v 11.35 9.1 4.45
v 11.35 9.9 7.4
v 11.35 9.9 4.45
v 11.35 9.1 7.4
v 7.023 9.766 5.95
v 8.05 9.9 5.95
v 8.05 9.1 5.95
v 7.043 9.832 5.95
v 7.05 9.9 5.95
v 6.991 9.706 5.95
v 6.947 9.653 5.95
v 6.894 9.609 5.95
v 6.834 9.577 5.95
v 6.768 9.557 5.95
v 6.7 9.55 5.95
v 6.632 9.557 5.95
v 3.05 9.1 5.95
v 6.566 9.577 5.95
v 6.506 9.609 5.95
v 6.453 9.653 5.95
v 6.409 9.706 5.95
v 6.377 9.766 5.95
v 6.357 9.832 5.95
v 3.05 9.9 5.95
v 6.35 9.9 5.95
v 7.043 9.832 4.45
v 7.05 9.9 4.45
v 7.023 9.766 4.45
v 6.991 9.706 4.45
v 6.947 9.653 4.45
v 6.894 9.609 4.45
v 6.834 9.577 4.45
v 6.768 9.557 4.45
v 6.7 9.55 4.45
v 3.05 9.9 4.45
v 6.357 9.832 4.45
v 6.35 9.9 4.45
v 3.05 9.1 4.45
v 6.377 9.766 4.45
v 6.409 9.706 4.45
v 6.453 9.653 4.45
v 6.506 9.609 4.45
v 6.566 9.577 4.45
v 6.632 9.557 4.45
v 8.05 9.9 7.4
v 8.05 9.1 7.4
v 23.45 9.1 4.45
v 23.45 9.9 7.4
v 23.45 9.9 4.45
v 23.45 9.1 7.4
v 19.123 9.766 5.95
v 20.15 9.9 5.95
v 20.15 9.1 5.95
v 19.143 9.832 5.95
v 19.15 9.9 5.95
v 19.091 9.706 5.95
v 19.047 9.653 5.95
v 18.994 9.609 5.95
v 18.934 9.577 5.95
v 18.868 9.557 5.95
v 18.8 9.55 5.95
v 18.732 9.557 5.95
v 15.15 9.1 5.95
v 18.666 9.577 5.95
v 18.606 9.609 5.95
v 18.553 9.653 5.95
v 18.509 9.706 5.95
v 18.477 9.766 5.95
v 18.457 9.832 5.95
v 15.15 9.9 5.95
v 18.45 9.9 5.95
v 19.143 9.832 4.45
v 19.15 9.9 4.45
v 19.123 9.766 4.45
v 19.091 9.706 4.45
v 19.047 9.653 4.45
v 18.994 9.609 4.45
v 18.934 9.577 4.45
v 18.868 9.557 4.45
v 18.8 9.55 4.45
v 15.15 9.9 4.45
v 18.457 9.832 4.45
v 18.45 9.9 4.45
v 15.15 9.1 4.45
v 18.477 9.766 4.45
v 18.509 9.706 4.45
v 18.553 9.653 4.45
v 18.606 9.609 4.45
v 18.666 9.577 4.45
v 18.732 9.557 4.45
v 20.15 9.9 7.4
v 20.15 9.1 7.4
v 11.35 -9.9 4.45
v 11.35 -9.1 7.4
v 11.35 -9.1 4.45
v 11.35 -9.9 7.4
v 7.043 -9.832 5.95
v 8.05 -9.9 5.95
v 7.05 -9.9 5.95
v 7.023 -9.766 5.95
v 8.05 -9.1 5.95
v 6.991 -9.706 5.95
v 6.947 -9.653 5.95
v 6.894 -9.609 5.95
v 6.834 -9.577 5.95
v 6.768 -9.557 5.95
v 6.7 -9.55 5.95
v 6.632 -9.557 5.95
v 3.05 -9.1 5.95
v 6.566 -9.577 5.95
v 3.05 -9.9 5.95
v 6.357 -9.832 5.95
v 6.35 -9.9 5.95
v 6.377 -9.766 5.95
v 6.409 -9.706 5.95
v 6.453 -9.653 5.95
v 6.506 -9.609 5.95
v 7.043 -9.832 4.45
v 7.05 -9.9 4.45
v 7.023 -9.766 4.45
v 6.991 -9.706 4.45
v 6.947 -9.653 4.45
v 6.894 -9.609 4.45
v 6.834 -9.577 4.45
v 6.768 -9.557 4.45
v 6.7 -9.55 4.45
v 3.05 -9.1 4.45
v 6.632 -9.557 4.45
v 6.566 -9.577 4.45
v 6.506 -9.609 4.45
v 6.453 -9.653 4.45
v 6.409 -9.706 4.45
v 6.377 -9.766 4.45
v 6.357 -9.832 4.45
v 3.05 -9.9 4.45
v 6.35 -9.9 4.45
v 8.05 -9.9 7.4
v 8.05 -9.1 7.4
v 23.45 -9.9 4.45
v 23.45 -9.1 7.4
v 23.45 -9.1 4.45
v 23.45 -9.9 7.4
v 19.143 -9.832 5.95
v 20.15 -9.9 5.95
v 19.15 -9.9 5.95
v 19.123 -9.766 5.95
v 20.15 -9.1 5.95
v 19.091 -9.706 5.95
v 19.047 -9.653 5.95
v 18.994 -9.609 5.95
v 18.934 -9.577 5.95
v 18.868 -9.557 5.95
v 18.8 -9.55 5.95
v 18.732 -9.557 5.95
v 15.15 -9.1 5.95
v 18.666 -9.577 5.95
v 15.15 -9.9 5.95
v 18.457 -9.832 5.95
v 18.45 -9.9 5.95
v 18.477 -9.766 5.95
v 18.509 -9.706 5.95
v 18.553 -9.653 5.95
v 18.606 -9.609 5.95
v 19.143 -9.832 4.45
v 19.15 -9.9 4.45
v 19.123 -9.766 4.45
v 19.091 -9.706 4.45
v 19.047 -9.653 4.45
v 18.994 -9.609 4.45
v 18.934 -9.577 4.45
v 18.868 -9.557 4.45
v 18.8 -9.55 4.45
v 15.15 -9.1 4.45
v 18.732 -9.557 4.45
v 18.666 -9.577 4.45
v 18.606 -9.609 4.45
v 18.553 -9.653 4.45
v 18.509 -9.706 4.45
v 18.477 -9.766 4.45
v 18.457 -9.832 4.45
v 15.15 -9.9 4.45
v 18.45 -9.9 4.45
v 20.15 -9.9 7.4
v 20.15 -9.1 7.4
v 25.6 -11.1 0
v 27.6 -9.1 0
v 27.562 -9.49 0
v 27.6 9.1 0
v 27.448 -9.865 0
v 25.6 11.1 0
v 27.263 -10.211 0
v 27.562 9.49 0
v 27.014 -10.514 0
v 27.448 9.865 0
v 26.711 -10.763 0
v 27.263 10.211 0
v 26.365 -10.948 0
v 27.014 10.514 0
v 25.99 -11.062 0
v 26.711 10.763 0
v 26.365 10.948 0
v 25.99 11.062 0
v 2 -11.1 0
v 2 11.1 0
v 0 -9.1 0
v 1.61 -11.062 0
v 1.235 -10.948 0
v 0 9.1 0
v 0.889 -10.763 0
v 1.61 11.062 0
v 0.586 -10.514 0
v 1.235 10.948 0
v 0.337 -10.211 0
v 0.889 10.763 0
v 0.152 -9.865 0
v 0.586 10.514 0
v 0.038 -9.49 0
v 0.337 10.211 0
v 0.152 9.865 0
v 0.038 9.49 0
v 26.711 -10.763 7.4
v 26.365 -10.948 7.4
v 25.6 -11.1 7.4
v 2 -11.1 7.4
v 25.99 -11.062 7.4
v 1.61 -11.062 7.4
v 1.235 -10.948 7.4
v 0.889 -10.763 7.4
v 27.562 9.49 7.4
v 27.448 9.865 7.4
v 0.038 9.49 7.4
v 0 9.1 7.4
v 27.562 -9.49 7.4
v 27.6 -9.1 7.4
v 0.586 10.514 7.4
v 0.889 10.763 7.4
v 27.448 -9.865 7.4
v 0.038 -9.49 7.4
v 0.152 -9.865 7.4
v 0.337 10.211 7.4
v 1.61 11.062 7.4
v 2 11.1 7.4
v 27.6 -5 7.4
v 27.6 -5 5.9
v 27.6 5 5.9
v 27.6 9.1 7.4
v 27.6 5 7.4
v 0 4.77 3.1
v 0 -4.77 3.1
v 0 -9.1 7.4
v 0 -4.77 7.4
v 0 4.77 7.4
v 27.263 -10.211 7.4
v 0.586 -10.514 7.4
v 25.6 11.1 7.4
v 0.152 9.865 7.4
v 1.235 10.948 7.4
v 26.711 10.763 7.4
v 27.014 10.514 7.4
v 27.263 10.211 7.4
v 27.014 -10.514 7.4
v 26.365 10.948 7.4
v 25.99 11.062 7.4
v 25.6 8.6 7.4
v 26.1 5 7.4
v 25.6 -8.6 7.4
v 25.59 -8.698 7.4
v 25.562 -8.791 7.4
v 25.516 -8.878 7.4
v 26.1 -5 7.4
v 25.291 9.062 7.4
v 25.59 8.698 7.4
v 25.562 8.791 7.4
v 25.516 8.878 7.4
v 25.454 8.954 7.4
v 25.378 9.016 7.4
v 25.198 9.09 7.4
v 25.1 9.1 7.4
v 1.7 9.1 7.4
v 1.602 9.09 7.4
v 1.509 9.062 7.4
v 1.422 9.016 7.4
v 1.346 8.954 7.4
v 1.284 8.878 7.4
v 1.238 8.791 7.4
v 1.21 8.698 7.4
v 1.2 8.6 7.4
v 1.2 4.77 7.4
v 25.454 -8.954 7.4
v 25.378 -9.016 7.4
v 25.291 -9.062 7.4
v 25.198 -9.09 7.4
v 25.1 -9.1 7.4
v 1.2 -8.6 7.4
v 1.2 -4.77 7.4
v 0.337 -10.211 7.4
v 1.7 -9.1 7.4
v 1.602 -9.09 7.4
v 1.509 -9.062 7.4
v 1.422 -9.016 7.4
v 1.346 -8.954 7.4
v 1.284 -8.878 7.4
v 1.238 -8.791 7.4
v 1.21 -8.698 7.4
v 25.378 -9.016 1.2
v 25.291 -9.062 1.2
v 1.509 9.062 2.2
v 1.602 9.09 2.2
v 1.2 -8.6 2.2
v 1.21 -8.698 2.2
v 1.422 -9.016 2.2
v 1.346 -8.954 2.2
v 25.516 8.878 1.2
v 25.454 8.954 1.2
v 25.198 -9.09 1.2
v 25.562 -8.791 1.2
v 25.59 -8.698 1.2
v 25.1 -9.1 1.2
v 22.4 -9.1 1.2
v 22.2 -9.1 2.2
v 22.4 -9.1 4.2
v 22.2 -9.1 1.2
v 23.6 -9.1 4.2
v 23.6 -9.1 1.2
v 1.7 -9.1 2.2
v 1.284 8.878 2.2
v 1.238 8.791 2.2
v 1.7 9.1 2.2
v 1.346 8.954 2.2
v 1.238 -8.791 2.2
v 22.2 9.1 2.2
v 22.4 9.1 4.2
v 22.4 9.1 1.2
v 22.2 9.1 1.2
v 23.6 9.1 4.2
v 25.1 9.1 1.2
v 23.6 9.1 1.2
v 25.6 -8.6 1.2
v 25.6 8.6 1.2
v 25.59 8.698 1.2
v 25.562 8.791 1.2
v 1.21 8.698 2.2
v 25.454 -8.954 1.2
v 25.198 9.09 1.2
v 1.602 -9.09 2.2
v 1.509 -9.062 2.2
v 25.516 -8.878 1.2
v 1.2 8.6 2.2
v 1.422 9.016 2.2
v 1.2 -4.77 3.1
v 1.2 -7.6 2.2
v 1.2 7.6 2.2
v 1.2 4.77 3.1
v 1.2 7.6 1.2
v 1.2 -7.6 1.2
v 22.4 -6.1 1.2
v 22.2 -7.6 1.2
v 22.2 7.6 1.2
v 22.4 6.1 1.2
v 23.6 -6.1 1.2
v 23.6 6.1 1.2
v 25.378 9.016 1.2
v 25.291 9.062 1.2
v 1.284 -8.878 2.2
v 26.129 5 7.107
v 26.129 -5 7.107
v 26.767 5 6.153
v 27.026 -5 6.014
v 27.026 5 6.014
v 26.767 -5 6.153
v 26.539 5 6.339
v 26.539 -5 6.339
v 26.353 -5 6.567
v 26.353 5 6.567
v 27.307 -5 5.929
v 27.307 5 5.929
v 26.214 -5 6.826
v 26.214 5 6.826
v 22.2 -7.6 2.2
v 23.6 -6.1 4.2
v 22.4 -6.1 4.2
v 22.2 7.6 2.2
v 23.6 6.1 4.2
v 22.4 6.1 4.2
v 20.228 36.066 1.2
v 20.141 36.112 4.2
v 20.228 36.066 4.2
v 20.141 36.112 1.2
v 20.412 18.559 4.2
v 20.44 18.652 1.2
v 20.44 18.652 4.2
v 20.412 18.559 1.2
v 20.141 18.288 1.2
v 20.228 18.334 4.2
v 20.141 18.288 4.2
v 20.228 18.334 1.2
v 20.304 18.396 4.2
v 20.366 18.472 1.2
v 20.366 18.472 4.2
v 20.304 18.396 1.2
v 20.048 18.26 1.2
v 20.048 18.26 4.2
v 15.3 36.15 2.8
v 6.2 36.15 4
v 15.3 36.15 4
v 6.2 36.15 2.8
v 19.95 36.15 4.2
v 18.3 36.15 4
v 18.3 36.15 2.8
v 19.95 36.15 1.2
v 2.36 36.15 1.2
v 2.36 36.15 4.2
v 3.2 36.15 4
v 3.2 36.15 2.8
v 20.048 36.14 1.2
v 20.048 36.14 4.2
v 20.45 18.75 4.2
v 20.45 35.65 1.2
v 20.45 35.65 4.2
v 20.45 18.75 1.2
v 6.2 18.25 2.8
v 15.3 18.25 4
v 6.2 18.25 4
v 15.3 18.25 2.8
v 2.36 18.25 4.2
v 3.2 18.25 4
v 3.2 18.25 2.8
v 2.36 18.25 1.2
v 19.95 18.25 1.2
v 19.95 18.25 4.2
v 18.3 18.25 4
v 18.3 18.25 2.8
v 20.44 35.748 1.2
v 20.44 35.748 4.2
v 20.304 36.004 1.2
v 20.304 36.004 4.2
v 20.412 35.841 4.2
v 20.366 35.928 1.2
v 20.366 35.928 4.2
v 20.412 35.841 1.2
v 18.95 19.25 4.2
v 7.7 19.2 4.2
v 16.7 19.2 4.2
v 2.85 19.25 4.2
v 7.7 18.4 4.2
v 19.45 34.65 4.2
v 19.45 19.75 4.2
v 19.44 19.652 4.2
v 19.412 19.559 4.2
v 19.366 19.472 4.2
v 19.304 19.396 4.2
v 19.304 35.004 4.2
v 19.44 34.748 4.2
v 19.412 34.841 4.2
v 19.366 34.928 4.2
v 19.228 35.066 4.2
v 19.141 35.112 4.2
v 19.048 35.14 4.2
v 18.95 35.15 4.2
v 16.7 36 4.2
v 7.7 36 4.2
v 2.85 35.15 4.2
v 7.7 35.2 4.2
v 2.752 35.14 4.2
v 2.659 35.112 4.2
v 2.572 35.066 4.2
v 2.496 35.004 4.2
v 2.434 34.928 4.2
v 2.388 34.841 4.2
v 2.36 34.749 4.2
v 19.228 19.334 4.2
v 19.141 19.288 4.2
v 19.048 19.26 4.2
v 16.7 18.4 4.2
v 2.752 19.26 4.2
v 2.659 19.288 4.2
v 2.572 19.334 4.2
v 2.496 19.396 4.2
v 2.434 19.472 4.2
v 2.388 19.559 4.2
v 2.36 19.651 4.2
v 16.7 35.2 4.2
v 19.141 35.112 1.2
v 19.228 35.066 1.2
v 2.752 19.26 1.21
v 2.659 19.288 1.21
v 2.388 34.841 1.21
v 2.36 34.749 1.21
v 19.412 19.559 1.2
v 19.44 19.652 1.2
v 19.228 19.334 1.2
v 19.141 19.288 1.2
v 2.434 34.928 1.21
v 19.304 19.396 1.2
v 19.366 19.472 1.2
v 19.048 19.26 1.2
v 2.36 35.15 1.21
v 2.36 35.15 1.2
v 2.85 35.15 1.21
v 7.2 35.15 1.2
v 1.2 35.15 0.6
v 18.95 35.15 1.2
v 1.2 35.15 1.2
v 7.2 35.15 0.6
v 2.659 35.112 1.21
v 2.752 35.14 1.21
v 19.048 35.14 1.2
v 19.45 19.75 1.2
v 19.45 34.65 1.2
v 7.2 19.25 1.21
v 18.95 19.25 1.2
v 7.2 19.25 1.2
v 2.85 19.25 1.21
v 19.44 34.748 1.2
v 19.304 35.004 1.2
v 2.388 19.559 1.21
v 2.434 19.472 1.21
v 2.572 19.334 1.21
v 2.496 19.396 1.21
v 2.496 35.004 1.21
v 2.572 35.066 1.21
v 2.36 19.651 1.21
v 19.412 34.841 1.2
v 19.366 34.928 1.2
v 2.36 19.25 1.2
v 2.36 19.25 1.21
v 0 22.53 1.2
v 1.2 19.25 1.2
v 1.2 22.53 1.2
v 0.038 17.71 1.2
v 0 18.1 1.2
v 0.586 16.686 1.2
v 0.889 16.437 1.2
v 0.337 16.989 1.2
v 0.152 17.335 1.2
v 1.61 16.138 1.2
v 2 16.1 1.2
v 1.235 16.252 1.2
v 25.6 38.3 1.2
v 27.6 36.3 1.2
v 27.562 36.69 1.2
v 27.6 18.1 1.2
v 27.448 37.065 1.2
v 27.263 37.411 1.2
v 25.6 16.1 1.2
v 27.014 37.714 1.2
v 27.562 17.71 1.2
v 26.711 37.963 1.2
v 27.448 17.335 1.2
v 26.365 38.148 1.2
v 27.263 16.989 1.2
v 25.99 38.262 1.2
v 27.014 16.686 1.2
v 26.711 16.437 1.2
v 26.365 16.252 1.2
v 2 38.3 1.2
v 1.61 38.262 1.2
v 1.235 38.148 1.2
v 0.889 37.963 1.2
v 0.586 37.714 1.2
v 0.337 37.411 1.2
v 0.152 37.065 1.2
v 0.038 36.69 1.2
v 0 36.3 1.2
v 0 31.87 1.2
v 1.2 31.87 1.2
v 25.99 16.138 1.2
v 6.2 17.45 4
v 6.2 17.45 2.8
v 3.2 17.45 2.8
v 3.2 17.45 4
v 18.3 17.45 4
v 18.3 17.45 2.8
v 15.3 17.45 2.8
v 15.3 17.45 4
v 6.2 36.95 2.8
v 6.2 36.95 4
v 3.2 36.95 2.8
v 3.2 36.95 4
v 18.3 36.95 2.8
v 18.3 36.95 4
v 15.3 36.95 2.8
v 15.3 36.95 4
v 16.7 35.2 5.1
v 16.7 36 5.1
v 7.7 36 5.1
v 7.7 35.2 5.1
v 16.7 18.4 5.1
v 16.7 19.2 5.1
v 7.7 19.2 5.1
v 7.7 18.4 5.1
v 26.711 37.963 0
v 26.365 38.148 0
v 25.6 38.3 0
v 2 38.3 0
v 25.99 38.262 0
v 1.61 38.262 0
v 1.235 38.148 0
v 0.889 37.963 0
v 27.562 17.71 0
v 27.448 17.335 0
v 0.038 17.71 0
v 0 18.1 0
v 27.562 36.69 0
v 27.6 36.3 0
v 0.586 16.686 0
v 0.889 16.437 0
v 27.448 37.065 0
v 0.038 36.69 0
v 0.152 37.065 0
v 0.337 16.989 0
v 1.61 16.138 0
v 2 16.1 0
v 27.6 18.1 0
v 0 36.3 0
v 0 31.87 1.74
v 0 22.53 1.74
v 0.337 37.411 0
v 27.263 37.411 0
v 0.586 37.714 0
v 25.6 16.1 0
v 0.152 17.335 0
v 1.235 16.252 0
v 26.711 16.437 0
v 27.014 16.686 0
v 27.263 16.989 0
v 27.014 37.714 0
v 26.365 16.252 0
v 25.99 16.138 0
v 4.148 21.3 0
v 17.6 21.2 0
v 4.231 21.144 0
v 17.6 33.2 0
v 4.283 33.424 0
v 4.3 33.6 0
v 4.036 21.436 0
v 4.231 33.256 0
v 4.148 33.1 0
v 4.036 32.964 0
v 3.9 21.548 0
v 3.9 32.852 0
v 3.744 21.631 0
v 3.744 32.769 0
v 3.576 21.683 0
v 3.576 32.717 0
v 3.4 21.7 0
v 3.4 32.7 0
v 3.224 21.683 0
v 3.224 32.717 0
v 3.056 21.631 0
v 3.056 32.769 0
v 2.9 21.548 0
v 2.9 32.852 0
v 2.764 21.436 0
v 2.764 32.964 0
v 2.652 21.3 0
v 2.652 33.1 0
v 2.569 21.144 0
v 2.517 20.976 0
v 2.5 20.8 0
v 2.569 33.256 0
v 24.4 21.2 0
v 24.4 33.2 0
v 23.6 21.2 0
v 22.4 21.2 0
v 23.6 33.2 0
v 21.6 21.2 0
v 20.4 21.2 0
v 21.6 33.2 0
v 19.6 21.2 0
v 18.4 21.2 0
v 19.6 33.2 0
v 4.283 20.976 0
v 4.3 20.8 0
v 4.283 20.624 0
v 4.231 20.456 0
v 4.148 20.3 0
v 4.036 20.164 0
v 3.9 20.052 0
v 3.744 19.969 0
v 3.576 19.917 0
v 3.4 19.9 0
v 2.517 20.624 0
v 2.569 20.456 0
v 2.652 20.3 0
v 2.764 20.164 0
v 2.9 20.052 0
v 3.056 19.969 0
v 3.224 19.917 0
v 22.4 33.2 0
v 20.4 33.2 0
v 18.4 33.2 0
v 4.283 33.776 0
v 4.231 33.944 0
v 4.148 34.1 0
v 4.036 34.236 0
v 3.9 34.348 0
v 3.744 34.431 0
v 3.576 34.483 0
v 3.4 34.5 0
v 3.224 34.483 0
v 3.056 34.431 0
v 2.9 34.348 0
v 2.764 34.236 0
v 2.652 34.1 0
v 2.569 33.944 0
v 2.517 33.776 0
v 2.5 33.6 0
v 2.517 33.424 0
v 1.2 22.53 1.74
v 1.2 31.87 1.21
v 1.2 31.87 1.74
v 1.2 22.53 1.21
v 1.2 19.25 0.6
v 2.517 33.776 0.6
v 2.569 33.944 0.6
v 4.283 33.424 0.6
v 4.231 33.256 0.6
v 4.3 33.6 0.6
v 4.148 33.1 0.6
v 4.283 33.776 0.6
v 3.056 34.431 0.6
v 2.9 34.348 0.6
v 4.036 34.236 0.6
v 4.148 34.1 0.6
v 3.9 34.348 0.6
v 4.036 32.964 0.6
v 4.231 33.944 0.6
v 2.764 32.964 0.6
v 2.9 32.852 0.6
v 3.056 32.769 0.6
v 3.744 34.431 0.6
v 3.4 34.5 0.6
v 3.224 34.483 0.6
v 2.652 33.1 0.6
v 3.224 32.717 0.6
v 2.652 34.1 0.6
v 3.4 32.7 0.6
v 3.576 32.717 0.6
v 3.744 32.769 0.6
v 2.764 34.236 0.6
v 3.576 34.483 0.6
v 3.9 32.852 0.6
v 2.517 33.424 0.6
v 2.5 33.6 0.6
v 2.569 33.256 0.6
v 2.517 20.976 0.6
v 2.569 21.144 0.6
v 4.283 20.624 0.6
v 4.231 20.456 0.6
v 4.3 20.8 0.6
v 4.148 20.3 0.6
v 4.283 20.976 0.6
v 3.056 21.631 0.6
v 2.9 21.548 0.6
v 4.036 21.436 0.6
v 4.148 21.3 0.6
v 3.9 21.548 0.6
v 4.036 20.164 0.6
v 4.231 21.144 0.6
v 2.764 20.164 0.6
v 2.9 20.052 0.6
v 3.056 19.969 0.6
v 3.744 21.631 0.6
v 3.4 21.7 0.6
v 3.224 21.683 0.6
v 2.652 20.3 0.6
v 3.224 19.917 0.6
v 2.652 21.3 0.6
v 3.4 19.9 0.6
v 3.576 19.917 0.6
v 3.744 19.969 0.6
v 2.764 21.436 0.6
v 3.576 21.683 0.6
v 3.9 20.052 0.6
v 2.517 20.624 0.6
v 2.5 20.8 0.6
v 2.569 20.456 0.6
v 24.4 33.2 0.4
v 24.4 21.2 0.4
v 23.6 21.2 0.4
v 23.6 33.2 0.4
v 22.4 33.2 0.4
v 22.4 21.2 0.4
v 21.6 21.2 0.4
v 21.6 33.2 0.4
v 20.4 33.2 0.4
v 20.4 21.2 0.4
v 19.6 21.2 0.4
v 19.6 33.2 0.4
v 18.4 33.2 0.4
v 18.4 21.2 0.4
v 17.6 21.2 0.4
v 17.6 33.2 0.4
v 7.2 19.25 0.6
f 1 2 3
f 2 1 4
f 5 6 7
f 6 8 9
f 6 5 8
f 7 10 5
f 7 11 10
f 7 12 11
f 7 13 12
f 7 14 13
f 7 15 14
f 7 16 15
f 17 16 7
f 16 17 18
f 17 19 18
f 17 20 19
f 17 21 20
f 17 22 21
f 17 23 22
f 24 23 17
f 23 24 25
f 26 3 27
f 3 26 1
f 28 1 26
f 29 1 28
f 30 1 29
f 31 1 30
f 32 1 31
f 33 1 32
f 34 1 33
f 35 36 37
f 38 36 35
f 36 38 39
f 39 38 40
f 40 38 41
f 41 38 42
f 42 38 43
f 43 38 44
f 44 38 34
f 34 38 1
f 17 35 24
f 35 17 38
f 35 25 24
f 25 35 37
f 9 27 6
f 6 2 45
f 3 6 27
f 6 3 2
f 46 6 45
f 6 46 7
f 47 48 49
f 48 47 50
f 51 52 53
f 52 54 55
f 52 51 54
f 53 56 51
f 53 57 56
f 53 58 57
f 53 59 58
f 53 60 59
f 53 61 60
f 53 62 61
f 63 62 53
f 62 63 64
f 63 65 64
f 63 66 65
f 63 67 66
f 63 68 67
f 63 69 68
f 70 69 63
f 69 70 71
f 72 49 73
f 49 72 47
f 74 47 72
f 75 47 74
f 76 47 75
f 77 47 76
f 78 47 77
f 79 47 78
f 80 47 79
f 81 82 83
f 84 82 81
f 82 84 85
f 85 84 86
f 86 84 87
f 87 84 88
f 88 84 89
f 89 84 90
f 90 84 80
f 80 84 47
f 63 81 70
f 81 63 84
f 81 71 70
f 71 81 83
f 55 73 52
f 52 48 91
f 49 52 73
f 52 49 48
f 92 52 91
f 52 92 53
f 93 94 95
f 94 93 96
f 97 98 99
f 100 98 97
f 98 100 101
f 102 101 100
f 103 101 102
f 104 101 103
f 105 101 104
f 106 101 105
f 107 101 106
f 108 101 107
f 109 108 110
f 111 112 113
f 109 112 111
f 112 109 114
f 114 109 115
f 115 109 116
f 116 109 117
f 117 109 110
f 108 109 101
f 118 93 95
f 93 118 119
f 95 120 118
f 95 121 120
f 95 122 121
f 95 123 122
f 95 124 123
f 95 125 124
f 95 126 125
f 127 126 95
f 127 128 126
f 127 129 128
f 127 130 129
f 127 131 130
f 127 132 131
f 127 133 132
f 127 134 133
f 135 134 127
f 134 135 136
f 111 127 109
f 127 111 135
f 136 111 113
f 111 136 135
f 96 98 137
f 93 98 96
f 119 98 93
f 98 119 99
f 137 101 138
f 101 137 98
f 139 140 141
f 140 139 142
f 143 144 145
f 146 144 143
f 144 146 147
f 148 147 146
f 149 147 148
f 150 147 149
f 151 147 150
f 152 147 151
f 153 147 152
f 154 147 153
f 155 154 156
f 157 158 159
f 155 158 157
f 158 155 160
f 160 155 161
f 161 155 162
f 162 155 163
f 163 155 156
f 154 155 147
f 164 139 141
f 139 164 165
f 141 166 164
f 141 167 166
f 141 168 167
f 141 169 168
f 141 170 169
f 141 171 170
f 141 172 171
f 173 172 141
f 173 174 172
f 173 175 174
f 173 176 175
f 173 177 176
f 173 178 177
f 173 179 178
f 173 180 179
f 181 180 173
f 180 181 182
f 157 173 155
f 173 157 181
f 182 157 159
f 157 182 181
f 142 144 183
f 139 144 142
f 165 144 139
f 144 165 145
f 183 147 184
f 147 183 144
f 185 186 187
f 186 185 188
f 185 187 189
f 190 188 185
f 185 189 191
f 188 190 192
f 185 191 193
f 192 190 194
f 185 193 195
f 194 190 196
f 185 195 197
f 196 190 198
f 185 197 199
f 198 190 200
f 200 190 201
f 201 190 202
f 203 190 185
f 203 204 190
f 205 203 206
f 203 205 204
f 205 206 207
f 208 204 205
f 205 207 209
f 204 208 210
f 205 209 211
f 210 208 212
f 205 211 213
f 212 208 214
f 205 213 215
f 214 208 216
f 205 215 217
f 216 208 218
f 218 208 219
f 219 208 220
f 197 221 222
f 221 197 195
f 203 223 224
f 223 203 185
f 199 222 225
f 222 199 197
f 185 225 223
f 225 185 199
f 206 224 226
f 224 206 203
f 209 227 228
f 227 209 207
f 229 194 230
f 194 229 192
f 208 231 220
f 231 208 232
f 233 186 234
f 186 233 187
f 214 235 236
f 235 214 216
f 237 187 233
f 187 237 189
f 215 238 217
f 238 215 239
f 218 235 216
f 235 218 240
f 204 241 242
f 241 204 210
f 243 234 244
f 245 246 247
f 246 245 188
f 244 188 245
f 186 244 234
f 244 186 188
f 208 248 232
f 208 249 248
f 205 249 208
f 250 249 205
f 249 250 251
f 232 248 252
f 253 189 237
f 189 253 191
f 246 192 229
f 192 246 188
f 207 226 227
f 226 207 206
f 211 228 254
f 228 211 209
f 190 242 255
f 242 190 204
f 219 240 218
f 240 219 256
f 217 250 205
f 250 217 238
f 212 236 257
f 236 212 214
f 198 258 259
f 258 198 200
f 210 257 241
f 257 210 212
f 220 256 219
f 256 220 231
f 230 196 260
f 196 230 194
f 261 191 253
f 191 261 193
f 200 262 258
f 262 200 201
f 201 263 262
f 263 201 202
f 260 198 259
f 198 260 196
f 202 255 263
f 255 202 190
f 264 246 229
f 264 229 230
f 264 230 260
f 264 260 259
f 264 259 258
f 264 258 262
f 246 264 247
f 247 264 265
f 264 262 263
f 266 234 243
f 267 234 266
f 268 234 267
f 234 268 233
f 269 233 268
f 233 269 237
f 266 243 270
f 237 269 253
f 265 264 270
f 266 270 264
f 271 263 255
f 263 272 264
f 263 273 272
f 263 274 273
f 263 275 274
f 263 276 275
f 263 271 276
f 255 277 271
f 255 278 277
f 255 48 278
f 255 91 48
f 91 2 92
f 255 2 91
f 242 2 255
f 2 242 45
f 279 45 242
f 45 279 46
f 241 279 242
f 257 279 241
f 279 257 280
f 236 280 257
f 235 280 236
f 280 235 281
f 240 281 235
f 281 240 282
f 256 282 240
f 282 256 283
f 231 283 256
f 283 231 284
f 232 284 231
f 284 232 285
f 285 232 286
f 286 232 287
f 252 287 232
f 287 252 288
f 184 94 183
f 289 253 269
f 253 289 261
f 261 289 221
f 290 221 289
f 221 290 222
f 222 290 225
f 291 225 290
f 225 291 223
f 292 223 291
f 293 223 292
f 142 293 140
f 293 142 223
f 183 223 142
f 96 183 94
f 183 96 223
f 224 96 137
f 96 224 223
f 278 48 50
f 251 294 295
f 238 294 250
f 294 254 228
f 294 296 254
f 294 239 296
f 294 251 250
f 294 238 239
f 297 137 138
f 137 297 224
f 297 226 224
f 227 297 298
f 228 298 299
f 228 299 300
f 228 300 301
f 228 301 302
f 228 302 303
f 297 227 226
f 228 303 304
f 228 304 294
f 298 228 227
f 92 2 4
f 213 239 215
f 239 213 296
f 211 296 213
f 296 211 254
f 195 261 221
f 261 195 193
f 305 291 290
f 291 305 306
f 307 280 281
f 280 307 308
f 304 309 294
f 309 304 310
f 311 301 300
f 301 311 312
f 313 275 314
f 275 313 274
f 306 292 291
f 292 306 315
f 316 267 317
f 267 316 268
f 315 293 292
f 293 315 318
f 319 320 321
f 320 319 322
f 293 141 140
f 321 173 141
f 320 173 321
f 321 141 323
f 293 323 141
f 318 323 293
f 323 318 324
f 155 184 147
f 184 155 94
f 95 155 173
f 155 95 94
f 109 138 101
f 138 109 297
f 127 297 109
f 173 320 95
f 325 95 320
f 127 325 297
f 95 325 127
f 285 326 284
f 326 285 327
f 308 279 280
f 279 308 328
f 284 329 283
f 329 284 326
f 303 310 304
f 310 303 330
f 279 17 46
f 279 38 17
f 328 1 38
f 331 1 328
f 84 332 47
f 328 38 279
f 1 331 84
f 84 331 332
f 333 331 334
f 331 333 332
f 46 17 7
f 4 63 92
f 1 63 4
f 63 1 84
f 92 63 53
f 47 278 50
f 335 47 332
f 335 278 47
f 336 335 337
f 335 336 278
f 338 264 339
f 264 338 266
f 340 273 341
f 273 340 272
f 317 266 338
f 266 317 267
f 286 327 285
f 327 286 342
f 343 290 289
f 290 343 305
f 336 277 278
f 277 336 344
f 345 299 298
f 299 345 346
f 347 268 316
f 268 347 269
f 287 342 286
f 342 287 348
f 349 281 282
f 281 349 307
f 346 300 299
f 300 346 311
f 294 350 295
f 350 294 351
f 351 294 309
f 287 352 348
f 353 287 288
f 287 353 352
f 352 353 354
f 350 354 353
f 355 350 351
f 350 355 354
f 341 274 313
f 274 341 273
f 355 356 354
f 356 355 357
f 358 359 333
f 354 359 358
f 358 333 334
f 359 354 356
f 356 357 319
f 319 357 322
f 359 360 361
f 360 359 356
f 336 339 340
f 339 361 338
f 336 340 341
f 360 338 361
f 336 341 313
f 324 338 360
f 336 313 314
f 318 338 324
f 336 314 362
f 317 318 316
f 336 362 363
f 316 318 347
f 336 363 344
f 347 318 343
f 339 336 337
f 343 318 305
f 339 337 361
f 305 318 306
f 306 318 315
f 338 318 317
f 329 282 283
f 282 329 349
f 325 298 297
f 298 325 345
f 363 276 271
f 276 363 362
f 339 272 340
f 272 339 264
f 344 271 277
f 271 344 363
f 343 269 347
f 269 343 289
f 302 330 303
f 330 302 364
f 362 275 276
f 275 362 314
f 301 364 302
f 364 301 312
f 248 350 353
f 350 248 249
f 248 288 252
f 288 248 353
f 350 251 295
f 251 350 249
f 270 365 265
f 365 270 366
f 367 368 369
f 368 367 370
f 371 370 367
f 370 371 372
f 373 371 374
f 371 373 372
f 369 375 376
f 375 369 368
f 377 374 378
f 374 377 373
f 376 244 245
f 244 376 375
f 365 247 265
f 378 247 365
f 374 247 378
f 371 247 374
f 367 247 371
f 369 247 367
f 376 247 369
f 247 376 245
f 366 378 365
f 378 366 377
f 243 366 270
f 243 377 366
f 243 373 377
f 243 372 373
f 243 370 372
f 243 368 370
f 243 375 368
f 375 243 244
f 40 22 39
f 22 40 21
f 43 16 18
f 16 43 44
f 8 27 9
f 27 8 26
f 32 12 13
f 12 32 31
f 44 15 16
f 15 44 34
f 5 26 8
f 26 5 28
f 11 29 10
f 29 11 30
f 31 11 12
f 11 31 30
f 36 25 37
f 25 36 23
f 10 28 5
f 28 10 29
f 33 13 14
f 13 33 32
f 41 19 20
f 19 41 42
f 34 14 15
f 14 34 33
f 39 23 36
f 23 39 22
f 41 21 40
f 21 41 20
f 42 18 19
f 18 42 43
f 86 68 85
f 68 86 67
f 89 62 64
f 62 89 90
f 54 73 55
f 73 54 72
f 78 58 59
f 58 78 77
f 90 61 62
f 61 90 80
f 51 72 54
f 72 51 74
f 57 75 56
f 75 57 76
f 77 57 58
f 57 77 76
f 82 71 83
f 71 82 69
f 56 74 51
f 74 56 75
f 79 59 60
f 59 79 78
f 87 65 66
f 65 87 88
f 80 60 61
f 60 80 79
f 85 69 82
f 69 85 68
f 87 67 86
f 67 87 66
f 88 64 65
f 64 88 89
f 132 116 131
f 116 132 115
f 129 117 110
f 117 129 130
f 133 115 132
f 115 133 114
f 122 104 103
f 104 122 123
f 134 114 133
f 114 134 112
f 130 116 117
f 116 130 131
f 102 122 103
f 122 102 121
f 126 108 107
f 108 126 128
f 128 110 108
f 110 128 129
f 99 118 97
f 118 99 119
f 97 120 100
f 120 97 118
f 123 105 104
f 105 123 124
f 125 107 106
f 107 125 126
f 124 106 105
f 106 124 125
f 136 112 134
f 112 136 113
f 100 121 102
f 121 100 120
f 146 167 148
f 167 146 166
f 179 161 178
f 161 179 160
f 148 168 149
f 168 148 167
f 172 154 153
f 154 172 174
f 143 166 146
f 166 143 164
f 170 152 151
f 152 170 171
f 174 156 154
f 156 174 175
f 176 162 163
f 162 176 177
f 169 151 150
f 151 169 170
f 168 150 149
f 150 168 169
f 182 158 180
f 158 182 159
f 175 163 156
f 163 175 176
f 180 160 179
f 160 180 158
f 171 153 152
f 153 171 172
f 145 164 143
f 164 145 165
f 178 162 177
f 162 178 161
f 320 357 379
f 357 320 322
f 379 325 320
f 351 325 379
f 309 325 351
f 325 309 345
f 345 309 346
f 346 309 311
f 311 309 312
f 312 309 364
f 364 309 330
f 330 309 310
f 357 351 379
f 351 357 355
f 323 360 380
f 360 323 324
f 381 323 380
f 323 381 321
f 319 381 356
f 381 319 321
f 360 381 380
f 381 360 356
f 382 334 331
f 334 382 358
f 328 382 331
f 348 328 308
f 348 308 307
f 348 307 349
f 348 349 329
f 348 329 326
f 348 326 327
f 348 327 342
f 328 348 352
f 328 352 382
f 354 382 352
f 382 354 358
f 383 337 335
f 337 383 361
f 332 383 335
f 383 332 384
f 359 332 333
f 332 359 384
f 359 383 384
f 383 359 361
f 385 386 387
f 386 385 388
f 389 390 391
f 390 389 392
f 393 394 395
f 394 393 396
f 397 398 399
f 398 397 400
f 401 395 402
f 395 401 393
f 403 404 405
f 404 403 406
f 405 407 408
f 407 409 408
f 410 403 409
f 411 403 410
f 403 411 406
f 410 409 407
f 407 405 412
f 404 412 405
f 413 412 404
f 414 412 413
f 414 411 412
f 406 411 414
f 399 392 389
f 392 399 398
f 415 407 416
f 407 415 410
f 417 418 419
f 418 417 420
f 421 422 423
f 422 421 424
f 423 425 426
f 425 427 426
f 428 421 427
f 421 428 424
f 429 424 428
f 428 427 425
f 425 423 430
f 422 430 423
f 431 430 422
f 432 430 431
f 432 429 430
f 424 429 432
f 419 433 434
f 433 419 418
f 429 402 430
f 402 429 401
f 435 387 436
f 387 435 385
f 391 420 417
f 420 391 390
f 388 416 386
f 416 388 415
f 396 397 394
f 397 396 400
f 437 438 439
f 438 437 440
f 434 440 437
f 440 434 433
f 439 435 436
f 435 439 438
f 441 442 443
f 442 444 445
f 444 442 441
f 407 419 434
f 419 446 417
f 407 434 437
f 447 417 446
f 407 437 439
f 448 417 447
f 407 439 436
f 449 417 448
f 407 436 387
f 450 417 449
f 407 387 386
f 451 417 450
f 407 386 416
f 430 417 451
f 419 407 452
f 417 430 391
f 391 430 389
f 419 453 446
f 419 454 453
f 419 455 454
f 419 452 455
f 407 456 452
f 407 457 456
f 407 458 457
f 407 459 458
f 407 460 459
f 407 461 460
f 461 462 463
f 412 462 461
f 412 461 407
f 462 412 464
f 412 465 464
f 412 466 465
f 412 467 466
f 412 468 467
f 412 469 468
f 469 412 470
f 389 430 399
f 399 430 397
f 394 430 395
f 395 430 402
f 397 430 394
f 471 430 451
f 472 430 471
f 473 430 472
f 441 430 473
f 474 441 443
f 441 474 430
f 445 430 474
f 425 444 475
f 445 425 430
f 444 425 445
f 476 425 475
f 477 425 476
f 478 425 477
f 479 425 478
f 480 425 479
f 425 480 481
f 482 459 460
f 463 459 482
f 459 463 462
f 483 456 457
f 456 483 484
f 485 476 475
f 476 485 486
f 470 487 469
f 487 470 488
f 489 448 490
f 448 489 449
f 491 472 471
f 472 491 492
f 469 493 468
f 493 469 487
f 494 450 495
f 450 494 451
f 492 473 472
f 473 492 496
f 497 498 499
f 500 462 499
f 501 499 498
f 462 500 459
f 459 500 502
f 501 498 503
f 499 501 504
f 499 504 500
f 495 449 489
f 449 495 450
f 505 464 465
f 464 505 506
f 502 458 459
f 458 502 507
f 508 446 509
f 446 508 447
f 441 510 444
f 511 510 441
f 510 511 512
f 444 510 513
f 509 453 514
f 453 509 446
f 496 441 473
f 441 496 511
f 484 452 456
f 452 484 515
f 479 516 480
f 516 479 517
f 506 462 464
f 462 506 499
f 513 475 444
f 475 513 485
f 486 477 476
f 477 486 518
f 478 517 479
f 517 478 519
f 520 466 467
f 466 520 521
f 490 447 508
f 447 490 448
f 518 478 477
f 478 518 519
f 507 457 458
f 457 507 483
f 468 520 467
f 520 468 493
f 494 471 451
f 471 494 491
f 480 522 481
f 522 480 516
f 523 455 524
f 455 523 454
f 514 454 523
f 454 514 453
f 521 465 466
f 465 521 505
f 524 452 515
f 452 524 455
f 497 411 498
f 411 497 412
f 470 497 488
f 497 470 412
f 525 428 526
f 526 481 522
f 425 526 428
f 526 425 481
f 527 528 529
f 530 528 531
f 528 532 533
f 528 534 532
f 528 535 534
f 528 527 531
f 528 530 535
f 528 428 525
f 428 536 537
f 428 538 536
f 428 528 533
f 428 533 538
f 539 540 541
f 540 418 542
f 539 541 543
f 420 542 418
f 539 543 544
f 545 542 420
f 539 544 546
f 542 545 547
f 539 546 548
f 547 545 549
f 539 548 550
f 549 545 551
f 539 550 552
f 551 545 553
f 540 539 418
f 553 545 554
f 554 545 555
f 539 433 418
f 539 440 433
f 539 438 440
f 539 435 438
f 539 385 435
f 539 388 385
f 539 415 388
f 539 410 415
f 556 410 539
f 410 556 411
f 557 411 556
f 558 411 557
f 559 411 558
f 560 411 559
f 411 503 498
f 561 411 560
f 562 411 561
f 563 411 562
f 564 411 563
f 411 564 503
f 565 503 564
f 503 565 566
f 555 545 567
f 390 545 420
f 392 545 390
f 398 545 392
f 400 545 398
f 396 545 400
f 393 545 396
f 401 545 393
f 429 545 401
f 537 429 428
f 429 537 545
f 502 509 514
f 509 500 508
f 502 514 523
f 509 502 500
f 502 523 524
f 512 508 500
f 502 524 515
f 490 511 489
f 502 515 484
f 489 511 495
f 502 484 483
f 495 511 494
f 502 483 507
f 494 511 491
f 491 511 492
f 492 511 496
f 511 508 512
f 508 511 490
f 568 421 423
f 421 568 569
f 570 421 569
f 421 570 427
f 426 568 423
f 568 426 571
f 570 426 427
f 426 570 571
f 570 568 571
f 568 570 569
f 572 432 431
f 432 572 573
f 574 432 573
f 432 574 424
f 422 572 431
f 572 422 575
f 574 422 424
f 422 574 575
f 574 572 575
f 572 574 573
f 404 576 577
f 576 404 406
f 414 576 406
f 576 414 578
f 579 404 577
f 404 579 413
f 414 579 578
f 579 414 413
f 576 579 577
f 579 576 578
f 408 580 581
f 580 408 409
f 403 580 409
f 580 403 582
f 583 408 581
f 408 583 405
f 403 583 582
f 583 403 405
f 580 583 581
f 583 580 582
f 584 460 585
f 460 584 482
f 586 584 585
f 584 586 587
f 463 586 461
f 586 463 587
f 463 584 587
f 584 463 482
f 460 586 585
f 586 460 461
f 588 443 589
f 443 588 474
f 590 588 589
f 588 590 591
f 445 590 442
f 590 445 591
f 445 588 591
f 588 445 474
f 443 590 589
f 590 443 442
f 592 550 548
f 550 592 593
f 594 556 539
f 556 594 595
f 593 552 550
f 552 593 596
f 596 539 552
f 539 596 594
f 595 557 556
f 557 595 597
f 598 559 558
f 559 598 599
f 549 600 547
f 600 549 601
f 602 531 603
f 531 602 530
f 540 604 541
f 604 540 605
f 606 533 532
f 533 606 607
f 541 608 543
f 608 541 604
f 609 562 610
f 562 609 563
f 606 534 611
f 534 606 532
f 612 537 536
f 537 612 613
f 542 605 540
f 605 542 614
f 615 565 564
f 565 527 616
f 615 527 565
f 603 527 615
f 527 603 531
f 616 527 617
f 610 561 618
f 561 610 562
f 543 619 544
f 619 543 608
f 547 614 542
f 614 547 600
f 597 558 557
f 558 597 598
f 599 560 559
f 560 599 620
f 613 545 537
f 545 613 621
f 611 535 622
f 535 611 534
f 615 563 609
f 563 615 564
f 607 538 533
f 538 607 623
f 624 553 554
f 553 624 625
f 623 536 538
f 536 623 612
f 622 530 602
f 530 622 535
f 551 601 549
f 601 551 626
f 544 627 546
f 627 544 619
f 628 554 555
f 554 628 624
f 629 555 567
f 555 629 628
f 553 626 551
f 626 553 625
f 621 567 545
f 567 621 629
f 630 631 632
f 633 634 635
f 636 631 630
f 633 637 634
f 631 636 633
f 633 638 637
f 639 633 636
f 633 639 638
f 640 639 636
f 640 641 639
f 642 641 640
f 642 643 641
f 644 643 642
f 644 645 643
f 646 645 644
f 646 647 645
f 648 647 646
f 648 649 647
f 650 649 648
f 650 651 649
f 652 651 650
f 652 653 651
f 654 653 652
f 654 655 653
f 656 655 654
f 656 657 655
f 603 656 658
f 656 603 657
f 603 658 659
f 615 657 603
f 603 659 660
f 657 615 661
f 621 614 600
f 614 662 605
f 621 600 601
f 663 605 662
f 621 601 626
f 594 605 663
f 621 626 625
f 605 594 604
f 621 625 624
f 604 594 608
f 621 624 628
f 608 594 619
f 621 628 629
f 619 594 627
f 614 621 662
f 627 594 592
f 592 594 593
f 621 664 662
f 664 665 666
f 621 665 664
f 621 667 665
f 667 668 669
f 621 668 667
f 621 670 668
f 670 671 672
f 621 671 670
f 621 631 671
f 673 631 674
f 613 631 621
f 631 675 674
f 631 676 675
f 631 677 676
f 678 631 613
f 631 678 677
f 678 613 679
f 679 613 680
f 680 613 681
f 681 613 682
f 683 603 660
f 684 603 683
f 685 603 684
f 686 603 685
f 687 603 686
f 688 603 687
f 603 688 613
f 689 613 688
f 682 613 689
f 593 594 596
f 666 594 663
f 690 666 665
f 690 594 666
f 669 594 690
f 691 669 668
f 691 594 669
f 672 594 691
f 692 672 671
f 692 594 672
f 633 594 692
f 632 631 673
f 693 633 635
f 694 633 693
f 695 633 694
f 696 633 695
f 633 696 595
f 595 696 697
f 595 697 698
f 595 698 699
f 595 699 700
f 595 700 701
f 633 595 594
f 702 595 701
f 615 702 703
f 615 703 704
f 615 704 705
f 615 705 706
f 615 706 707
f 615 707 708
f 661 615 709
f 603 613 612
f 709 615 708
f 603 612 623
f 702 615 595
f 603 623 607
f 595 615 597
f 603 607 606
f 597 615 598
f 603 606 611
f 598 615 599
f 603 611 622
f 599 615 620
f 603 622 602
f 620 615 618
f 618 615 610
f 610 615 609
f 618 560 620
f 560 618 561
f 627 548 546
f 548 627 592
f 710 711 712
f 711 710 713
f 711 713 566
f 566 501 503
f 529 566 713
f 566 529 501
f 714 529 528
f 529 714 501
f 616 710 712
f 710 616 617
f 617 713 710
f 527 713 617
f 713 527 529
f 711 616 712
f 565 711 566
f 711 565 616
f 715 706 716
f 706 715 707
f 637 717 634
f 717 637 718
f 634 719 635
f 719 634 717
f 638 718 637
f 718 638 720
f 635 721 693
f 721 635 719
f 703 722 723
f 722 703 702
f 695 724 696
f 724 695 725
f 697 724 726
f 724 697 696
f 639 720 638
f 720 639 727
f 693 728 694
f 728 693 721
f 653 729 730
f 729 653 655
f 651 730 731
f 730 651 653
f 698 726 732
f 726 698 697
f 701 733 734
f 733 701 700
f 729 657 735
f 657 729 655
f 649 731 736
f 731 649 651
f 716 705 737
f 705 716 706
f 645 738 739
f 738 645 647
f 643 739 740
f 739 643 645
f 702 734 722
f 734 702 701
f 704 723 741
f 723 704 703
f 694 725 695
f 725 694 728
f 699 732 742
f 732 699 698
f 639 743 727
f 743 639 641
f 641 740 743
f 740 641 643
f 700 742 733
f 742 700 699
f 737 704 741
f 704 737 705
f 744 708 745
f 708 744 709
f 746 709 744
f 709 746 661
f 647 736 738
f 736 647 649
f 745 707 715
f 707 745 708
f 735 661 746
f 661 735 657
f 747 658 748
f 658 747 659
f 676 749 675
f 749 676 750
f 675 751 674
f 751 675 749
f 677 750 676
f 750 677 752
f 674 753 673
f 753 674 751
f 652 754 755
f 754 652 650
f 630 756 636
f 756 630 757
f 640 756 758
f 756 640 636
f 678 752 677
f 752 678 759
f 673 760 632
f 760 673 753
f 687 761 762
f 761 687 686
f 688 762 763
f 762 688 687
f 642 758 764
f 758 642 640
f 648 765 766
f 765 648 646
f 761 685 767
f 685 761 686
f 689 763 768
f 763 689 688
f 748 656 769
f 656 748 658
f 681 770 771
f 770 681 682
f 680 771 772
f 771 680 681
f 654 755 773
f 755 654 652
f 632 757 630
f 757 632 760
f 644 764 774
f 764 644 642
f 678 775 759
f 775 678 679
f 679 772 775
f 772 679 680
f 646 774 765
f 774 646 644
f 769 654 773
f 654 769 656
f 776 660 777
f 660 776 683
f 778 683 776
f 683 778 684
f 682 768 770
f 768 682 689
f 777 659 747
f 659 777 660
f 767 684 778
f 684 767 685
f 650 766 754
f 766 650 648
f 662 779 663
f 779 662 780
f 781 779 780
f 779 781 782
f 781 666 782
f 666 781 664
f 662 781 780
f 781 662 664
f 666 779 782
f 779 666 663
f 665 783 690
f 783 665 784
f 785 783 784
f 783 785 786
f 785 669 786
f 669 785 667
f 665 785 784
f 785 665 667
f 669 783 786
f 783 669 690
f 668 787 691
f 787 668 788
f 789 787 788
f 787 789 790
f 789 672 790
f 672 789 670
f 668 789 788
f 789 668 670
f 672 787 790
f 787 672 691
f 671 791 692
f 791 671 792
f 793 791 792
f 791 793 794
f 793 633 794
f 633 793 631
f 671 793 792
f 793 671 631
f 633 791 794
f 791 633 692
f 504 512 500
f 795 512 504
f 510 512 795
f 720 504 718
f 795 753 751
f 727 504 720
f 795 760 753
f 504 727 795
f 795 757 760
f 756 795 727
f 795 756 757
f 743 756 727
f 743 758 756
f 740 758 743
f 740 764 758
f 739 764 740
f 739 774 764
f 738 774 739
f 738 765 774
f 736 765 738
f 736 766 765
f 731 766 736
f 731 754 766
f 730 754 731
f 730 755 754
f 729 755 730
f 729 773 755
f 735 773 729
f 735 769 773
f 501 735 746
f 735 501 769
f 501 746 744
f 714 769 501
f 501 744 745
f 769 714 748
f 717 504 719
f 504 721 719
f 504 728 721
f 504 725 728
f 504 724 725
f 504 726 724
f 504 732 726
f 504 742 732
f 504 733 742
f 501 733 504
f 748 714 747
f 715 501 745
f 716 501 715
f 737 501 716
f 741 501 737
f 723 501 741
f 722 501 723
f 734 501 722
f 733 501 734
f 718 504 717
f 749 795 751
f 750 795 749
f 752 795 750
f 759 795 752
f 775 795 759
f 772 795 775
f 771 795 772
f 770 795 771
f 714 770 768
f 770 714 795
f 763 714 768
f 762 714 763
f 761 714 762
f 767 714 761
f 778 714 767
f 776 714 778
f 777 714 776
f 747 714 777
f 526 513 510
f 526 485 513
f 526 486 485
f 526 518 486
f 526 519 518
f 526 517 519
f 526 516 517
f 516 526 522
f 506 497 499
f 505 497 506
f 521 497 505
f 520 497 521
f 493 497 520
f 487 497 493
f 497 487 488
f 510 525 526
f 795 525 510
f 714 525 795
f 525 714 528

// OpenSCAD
// SPDX-License-Identifier: AGPL-3.0-or-later
// Board-only "slide" version of the XIAO ESP32S3 case: no room for the antenna inside.
// Same geometry and parameters as xiao-esp32s3-case.scad: edit them there, all versions stay in step.

include <xiao-esp32s3-case.scad>
style = "slide";
antenna = false;
